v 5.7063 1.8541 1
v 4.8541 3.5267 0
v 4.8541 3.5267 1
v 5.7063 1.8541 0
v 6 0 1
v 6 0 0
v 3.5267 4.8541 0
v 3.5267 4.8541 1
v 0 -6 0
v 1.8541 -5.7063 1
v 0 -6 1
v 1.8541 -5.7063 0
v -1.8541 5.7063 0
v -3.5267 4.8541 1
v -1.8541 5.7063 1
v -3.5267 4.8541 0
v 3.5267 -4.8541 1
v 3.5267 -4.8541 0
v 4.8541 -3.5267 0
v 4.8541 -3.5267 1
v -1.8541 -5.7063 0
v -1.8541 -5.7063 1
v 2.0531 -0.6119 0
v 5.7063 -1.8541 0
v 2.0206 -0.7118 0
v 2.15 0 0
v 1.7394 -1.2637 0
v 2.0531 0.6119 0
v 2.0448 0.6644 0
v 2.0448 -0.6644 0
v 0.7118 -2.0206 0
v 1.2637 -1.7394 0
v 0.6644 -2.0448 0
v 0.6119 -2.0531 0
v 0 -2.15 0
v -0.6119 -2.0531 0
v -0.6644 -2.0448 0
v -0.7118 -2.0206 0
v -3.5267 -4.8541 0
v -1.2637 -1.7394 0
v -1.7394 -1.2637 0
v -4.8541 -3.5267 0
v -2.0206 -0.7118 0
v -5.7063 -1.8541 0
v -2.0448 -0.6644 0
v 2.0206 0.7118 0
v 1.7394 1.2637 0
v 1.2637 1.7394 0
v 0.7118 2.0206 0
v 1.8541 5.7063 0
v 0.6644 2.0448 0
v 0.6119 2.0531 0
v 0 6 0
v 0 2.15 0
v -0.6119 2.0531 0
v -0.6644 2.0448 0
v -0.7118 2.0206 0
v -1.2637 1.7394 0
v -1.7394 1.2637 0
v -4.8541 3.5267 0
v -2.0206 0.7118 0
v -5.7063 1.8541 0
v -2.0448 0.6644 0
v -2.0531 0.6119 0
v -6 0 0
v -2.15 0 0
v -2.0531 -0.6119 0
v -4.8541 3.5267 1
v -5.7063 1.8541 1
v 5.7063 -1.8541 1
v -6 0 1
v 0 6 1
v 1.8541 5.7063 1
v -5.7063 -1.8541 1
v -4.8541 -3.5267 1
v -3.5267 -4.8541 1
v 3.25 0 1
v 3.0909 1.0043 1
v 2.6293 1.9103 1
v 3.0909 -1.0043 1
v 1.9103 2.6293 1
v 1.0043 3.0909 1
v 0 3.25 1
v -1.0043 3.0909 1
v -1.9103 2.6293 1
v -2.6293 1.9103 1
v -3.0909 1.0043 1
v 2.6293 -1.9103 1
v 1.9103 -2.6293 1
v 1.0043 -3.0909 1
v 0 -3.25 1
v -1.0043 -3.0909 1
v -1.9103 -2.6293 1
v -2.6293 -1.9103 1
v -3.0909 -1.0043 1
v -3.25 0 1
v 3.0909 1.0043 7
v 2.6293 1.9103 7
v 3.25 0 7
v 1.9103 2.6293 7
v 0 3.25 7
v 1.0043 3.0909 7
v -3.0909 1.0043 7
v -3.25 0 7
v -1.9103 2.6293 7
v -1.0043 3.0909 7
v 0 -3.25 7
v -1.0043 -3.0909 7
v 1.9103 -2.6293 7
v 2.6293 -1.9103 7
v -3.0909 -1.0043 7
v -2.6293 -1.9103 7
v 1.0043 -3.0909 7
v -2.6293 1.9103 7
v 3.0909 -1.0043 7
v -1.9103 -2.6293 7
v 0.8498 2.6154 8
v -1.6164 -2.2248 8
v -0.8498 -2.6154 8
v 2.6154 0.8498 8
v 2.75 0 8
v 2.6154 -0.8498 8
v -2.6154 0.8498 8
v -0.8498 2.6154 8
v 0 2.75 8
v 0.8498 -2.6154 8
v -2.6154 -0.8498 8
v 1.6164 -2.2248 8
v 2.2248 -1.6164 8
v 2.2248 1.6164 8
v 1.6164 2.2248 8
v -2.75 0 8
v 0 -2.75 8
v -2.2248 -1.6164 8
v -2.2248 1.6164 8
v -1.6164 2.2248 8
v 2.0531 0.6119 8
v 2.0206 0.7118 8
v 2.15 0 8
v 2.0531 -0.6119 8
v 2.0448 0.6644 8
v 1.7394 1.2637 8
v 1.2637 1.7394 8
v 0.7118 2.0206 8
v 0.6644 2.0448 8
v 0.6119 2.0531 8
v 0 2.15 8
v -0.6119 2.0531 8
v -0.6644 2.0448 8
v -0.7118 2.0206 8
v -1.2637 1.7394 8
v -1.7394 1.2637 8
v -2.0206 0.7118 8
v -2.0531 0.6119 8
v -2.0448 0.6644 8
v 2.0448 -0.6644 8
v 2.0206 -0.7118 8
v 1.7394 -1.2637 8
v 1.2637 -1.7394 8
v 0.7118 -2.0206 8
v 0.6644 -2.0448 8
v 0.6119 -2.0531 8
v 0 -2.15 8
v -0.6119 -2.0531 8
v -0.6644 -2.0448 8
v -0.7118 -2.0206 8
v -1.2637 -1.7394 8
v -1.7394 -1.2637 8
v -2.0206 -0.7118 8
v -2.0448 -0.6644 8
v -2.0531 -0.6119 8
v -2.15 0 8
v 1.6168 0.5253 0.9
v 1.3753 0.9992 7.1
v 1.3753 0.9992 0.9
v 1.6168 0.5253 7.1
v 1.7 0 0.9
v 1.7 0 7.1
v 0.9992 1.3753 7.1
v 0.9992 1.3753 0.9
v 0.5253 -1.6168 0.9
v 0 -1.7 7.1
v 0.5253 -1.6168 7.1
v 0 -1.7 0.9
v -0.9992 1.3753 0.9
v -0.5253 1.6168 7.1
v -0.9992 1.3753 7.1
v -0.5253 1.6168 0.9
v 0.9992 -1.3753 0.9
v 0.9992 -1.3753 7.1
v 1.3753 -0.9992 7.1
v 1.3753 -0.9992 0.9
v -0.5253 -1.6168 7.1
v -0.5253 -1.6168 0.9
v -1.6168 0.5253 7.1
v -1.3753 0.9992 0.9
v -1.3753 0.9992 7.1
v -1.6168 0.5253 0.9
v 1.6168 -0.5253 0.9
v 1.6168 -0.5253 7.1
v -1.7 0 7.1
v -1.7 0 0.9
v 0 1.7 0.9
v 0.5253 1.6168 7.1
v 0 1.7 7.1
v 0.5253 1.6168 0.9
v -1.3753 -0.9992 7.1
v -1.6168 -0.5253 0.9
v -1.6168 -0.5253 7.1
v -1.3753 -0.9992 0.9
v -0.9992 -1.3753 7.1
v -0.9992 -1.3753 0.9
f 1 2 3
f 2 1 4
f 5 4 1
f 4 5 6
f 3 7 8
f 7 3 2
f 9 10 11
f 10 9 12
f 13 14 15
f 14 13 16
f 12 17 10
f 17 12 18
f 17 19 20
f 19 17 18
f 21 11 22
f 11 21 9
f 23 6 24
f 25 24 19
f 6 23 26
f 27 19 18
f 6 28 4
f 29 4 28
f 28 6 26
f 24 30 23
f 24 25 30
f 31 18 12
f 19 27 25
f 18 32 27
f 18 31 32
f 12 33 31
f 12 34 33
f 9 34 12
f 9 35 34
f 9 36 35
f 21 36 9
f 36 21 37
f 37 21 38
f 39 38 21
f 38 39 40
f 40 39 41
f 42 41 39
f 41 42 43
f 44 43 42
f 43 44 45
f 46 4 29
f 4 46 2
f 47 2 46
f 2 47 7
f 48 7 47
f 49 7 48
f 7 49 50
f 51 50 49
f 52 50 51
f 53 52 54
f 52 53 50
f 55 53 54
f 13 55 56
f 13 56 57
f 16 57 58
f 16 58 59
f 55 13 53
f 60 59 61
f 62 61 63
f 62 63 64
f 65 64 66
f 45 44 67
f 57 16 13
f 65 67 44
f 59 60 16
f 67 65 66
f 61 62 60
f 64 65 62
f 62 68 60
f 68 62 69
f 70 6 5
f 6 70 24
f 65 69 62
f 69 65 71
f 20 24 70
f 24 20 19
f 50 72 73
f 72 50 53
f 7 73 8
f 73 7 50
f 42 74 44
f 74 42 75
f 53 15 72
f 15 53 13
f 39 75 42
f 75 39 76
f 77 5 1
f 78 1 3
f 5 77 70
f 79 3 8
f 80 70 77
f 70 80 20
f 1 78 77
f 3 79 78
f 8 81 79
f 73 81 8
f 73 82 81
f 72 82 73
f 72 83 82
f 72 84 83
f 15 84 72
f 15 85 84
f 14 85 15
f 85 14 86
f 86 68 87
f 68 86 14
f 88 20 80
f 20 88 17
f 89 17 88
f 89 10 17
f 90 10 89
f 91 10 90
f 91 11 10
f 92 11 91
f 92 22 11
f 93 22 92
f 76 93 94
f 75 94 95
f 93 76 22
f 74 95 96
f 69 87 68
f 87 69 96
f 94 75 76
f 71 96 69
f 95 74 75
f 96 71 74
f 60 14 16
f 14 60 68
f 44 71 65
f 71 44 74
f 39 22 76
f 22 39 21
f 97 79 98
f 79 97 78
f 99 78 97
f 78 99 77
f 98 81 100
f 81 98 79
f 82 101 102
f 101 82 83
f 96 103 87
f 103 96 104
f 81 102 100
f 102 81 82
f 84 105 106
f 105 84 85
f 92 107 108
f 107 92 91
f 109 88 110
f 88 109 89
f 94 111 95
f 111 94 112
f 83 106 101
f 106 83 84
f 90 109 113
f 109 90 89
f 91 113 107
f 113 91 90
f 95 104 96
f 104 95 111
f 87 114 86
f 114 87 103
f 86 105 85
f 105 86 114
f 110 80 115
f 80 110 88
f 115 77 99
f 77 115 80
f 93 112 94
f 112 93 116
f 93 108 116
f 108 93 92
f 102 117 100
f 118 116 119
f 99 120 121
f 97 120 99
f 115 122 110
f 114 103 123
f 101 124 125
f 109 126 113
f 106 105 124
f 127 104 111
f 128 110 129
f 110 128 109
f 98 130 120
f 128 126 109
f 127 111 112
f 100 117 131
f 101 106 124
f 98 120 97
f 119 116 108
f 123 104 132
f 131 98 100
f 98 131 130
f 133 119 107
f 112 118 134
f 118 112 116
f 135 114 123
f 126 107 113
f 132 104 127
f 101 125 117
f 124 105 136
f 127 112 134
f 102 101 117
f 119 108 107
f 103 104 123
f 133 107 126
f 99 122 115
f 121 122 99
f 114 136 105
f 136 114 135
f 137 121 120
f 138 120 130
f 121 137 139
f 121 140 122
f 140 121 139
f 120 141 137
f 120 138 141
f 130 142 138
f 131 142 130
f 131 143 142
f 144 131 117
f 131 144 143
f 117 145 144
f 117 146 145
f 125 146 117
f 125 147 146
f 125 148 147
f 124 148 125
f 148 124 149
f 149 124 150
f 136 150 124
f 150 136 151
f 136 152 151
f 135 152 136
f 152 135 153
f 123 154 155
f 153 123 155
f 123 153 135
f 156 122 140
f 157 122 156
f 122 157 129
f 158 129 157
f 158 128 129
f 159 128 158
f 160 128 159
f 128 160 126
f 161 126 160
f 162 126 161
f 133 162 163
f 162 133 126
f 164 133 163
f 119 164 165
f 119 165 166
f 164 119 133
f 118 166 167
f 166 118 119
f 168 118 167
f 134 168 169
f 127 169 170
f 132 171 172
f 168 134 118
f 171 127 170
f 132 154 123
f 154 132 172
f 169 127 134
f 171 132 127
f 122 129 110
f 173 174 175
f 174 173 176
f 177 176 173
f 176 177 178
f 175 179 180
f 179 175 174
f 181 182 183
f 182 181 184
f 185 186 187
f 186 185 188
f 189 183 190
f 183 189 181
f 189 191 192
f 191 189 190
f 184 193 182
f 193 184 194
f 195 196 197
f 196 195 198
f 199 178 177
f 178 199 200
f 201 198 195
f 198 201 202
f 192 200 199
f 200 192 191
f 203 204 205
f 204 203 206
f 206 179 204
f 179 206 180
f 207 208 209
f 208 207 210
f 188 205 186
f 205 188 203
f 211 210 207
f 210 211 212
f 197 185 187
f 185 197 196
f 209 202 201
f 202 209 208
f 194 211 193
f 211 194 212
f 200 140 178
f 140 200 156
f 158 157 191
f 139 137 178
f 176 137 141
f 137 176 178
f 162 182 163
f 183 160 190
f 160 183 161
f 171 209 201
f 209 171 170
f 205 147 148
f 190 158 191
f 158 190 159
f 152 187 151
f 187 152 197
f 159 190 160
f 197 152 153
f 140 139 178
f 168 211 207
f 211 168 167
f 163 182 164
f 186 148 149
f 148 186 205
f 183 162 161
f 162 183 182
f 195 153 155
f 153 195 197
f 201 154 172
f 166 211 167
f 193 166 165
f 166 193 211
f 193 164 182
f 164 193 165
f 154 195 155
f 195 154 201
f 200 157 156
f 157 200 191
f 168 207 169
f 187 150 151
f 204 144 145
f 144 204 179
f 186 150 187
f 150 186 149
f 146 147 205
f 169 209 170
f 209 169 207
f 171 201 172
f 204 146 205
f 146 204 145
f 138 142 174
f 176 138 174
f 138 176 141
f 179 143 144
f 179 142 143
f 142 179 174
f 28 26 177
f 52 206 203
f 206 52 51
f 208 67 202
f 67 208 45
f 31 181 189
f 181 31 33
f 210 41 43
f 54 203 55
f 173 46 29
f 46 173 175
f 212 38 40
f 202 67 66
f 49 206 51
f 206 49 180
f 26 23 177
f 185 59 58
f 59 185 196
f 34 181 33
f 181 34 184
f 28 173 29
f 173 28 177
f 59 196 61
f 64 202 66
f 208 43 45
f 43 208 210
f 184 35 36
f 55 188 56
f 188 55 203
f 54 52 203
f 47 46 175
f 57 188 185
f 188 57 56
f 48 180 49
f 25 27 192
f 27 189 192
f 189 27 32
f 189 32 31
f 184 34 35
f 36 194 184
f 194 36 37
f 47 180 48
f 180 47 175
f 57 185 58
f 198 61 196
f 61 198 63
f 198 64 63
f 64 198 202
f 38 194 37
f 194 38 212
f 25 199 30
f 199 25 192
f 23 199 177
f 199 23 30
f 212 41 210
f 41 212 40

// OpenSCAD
// Build Plate Footing

/* [Dimensions] */

// the footing base height
base_height = 1;

// the footing base diameter
base_diameter = 12;

// the height of the footing inner
inner_height = 8;

// the diameter of the footing inner
inner_diameter = 6.5;

// the diameter of the footing hole
hole_diameter = 3.4;

/* [hidden] */
$fn = 20;

difference() {
 union() {
  cylinder(h=base_height, r=base_diameter/2);
  cylinder(h=inner_height-1, r=inner_diameter/2);
  translate([0,0,inner_height - 1]) cylinder(h=1, r1=inner_diameter/2, r2=inner_diameter/2-.5);
 }
 translate([0,0,-1]) cylinder(h=inner_height+2, r=hole_diameter/2);
 translate([0,0,inner_height-0.9]) cylinder(h=1, r1=hole_diameter/2, r2=hole_diameter/2+.5);
 translate([0,0,-0.1]) cylinder(h=1, r1=hole_diameter/2+0.5, r2=hole_diameter/2);
}
